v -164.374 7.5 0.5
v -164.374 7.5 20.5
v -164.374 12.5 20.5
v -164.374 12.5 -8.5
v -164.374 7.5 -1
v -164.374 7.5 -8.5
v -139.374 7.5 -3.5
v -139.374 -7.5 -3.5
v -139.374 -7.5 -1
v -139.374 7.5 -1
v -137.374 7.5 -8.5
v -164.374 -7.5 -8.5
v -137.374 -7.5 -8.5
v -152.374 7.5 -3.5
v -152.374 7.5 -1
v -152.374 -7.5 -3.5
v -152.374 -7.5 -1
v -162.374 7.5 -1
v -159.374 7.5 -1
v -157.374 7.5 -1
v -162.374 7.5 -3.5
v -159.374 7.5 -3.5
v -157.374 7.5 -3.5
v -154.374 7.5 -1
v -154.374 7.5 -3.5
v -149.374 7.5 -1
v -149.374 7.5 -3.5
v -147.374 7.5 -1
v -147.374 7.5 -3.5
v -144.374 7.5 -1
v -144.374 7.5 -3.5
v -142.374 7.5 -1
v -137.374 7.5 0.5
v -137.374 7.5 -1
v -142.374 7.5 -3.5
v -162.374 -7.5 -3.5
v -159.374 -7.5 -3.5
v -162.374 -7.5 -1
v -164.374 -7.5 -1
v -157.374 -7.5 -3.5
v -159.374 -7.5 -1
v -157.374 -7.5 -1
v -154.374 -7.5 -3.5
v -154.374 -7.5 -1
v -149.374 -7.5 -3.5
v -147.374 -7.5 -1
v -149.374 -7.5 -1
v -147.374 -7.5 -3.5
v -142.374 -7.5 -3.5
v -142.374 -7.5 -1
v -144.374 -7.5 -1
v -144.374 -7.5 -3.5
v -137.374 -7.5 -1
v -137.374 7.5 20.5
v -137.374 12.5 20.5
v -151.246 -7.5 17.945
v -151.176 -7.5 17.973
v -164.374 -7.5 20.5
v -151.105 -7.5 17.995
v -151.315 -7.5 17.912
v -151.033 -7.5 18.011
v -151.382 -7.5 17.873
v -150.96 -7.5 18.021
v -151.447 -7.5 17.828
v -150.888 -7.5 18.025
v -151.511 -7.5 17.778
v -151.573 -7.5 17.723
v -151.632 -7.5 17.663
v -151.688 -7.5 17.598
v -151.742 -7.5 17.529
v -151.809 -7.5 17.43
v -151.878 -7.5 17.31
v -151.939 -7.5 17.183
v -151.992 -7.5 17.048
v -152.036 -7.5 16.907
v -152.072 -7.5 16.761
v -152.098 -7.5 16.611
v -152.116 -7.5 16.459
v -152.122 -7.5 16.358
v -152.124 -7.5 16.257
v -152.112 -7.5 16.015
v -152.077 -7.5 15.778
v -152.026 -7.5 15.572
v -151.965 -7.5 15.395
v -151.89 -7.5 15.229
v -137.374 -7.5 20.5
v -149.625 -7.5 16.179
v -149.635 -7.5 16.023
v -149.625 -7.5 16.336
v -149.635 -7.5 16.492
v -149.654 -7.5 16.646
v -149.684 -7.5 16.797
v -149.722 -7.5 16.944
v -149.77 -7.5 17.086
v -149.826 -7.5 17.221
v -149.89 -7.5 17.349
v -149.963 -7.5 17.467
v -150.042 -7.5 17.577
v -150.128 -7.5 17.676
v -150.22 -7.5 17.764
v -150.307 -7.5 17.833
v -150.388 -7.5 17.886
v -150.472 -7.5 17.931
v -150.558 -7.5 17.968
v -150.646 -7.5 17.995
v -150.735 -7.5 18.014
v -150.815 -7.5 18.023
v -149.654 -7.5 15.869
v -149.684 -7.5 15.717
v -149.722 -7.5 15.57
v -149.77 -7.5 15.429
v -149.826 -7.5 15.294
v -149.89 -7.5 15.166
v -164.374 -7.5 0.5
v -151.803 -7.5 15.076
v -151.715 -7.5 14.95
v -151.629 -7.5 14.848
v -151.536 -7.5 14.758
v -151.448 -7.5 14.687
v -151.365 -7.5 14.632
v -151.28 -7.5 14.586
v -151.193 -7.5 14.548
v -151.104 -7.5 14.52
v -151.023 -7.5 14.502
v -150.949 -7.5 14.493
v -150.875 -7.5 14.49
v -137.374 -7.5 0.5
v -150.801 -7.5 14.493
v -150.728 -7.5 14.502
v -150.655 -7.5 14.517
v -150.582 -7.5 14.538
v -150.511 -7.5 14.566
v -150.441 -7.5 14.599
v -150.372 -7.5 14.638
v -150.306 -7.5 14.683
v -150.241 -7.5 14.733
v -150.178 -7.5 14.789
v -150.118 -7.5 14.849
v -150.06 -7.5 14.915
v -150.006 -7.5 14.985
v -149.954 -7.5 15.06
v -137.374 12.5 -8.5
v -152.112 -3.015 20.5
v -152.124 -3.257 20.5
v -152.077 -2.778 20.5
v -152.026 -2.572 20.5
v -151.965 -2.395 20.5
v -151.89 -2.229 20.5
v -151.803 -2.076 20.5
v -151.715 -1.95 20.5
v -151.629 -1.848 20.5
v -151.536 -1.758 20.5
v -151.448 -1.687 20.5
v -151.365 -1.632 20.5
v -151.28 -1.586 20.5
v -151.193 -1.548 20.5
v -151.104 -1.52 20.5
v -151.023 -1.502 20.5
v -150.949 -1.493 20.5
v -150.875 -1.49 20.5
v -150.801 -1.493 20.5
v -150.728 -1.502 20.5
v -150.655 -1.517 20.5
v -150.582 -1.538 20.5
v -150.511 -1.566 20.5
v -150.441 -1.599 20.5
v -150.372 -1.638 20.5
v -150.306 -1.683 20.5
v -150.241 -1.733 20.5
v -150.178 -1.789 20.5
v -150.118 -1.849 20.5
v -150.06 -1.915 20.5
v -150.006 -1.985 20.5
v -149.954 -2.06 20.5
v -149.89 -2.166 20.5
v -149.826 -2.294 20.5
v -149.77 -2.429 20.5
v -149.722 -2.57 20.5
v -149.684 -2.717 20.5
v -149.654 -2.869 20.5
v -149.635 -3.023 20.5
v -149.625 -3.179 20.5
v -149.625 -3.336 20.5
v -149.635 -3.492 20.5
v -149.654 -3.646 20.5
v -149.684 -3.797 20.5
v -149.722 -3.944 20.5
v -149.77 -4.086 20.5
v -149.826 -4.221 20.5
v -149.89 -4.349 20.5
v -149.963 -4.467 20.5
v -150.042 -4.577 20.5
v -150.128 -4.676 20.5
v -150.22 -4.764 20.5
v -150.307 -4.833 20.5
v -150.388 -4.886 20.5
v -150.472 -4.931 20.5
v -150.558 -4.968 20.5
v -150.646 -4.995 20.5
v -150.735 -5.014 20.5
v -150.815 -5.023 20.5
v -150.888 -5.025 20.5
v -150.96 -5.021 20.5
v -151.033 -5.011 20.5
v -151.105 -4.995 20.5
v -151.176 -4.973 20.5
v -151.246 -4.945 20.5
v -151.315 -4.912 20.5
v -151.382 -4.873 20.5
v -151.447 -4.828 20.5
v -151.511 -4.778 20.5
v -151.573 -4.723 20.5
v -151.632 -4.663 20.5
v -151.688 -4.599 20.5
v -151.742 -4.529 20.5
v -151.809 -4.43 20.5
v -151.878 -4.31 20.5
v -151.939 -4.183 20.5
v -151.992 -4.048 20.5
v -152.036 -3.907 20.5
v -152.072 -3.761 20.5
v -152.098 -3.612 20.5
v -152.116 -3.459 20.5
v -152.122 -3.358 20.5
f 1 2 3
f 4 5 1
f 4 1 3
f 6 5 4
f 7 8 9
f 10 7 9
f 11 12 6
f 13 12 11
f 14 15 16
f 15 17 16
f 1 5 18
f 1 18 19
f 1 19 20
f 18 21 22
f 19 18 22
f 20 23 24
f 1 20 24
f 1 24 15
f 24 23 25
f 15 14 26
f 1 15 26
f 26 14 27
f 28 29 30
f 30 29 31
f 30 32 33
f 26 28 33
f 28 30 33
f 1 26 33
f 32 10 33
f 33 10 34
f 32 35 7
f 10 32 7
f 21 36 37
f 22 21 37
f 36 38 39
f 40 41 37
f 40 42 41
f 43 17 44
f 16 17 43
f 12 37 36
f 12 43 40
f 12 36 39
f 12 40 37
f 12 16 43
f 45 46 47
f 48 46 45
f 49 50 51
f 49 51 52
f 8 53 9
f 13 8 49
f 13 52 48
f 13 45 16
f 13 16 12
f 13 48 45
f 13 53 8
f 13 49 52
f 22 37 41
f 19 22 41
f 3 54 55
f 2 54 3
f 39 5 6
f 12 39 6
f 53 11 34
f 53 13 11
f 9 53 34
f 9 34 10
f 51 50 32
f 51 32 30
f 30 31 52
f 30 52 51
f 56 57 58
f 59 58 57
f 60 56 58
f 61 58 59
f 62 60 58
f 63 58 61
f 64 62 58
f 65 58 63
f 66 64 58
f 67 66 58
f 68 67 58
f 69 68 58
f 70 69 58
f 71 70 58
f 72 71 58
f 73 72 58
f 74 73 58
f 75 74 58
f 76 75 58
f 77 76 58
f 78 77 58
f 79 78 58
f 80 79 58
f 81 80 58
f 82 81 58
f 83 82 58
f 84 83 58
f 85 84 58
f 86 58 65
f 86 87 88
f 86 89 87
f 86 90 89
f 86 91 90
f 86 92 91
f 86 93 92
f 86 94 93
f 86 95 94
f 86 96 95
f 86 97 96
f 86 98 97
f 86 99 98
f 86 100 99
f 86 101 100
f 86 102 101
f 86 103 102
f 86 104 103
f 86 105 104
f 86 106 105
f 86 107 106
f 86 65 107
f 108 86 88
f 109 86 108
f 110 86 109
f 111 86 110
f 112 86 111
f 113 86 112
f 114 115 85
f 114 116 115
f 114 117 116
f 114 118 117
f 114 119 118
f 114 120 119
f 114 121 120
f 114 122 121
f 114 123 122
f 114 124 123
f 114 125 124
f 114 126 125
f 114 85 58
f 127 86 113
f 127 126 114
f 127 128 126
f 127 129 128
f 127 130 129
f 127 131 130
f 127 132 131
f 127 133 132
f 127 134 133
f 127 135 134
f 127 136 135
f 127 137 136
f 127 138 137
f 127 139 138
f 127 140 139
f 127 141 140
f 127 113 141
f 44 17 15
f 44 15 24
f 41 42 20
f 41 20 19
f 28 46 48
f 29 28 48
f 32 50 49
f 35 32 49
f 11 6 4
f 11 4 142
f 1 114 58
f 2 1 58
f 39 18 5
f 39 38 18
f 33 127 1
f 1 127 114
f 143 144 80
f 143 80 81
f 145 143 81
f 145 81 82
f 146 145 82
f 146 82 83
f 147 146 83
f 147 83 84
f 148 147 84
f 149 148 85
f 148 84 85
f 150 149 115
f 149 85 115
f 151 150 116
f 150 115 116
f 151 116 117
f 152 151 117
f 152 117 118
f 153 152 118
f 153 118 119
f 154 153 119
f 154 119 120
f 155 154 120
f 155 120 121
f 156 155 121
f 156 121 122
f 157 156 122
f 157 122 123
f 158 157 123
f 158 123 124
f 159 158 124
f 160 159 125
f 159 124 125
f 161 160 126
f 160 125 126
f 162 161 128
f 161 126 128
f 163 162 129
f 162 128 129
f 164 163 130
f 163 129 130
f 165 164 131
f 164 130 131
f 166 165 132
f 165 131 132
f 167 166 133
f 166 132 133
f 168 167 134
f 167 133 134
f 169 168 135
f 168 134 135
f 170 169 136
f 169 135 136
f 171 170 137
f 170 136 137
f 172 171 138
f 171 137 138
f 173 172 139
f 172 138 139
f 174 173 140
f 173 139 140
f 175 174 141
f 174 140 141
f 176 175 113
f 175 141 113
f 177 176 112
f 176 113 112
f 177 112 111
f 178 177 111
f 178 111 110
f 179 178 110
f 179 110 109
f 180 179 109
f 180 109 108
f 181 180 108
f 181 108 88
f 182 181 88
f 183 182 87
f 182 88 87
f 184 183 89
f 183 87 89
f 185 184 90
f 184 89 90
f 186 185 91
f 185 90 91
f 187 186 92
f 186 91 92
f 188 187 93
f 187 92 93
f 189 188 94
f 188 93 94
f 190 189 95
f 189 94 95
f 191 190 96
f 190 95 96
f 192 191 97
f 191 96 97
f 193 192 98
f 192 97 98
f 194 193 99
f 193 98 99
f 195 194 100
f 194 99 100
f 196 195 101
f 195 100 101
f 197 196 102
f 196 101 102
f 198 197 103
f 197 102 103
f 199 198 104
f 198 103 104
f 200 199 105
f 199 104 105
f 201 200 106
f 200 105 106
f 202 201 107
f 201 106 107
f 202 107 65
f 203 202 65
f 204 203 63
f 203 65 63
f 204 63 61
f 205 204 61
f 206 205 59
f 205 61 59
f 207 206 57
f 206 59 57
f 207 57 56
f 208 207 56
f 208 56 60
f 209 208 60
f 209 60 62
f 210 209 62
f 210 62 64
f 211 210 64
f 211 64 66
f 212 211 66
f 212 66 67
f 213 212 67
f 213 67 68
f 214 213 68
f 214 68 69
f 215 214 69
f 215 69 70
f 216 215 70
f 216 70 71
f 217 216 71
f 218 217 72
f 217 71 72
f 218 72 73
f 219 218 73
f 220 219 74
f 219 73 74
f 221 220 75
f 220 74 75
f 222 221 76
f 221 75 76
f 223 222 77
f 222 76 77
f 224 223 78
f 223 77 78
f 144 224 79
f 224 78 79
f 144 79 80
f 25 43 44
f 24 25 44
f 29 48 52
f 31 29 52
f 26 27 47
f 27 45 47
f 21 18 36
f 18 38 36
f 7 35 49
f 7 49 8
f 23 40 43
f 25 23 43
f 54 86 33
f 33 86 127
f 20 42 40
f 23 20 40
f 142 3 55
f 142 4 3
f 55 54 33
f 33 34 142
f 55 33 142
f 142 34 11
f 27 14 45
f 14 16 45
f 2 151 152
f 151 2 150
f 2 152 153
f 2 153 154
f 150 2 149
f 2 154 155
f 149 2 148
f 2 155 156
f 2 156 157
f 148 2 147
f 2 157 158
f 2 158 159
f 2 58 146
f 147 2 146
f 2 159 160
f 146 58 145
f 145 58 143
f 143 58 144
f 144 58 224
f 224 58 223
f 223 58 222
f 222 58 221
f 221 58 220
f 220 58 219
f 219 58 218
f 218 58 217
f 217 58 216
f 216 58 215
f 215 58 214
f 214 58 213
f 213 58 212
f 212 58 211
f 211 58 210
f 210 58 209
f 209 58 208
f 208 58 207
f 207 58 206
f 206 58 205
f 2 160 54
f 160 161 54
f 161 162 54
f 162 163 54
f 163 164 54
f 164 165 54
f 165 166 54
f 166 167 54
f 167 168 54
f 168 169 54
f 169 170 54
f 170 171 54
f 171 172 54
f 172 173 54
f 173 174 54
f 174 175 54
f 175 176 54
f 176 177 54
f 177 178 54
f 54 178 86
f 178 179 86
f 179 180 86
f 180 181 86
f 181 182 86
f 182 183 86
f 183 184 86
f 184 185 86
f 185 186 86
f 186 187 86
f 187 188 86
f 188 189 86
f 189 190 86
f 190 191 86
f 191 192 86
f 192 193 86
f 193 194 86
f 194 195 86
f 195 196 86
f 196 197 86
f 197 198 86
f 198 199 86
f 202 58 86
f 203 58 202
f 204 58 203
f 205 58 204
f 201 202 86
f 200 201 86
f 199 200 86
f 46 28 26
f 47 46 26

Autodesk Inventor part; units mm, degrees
ref_plane "YZ Plane" through (0, 0, 0) normal (1, 0, 0) x (0, 1, 0)
ref_plane "Work Plane1" through (-17.0854, 0, -12.1778) normal (0, 1, 0) x (0.4190489, 0, 0.9079637)
sketch "Sketch2" plane through (-17.0854, 0, -12.1778) normal (0, 1, 0) x (0.4190489, 0, 0.9079637)
  line L0 (17.3086, 10.8289) -> (-82.3096, -205.0164) projected
  arc A0 (17.3086, 10.8289) -> (-17.7803, 27.0234) centre (-0.2358, 18.9261) ccw projected
  line L1 (-117.3985, -188.822) -> (-17.7803, 27.0234) projected
  arc A1 (-117.3985, -188.822) -> (-82.3096, -205.0164) centre (-99.8541, -196.9192) ccw projected
  line L2 (-81.4017, -205.4355) -> (18.2166, 10.4099) projected
  arc A2 (-118.3065, -188.4029) -> (-81.4017, -205.4355) centre (-99.8541, -196.9192) ccw projected
  line L3 (-18.6883, 27.4424) -> (-118.3065, -188.4029) projected
  arc A3 (18.2166, 10.4099) -> (-18.6883, 27.4424) centre (-0.2358, 18.9261) ccw projected
  line L4 (-50.7339, -136.6006) -> (-53.0039, -135.553)
  line L5 (-53.0039, -135.553) -> (-51.7467, -132.8291)
  line L6 (-51.7467, -132.8291) -> (-49.4768, -133.8767)
  line L7 (-48.6387, -132.0608) -> (-50.9086, -131.0132)
  line L8 (-50.9086, -131.0132) -> (-49.6515, -128.2893)
  line L9 (-49.6515, -128.2893) -> (-47.3816, -129.3369)
  line L10 (-46.5435, -127.521) -> (-48.8134, -126.4733)
  line L11 (-48.8134, -126.4733) -> (-47.5562, -123.7494)
  line L12 (-47.5562, -123.7494) -> (-45.2863, -124.7971)
  line L13 (-44.4482, -122.9811) -> (-46.7181, -121.9335)
  line L14 (-46.7181, -121.9335) -> (-45.461, -119.2096)
  line L15 (-45.461, -119.2096) -> (-43.1911, -120.2572)
  line L16 (-42.353, -118.4413) -> (-44.6229, -117.3937)
  line L17 (-44.6229, -117.3937) -> (-43.3657, -114.6698)
  line L18 (-43.3657, -114.6698) -> (-41.0958, -115.7174)
  line L19 (-51.572, -138.4165) -> (-58.3818, -135.2737)
  line L20 (-58.3818, -135.2737) -> (-47.0674, -110.7586)
  line L21 (-47.0674, -110.7586) -> (-40.2577, -113.9015)
  line L22 (-53.8419, -137.3689) -> (-53.0039, -135.553) construction
  line L23 (-51.7467, -132.8291) -> (-50.9086, -131.0132) construction
  line L24 (-43.3657, -114.6698) -> (-42.5276, -112.8539) construction
  line L25 (-40.2577, -113.9015) -> (-38.8958, -114.5301) construction
  line L26 (-38.8958, -114.5301) -> (-50.2101, -139.0451)
  line L27 (-50.2101, -139.0451) -> (-32.0508, -147.4261)
  line L28 (-32.0508, -147.4261) -> (-20.7365, -122.9111)
  line L29 (-20.7365, -122.9111) -> (-38.8958, -114.5301)
  point P0 (-48.6387, -132.0608)
  point P1 (-47.3816, -129.3369)
  point P2 (-45.2863, -124.7971)
  point P3 (-44.4482, -122.9811)
  point P4 (-43.1911, -120.2572)
  point P5 (-42.353, -118.4413)
  point P6 (-41.0958, -115.7174)
  dimension "d9" = 2.5
  dimension "d10" = 3
  dimension "d13" = 5
  dimension "d18" = 5
  dimension "d21" = 1.5
  dimension "d22" = 20
ref_plane "Work Plane2" through (-258.0475, 7.5, -40.6457) normal (0, 1, 0) x (0, 0, 1)
ref_plane "Work Plane3" through (-258.0475, 7.5, -40.6457) normal (0, 1, 0) x (0, 0, 1)
extrude "Extrusion2" add sketch "Sketch2" along normal up to surface (7.5 mm away) contours L0 L18 L17 L16 L15 L14 L13 L12 L11 L10 L9 L8 L7 L6 L5 L4 L19 L20 L21 | L29 L28 L27 L26
sketch "Sketch3" plane through (-164.3738, 7.5, -8.5) normal (0, 1, 0) x (1, 0, 0)
  line L0 (27, -29) -> (27, -9) projected
  line L1 (0, 0) -> (27, 0)
  line L2 (27, 0) -> (27, -29)
  line L3 (27, -29) -> (0, -29)
  line L4 (0, -29) -> (0, 0)
  point P0 (164.3738, -8.5)
extrude "Extrusion3" add sketch "Sketch3" along normal blind 5
mirror "Mirror1" about plane through (-150.8738, 0, 10.5) normal (0, -1, 0) of "Extrusion2"
ref_plane "Work Plane4" through (-157.6238, -7.5, 20.5) normal (0, -0.7071068, -0.7071068) x (-1, 0, 0)
sketch "Sketch4" plane through (-157.6238, -7.5, 20.5) normal (0, -0.7071068, -0.7071068) x (-1, 0, 0)
  circle A0 centre (-6.75, 3) radius 1.25
  line L0 (-20.25, 28.2843) -> (6.75, 28.2843) projected
  line L1 (6.75, 28.2843) -> (6.75, 0) projected
  line L2 (6.75, 0) -> (-20.25, 0) projected
  line L3 (-20.25, 0) -> (-20.25, 28.2843) projected
  line L4 (-6.75, 3) -> (-6.75, 0) construction
  point P0 (-157.6238, 19.799)
  dimension "d28" = 2.5
  dimension "d29" = 3
extrude "Extrusion4" cut sketch "Sketch4" against normal through all contours A0
extrude "Extrusion5" cut sketch "Sketch4" along normal through all contours A0
properties part number "Belt Clip"
